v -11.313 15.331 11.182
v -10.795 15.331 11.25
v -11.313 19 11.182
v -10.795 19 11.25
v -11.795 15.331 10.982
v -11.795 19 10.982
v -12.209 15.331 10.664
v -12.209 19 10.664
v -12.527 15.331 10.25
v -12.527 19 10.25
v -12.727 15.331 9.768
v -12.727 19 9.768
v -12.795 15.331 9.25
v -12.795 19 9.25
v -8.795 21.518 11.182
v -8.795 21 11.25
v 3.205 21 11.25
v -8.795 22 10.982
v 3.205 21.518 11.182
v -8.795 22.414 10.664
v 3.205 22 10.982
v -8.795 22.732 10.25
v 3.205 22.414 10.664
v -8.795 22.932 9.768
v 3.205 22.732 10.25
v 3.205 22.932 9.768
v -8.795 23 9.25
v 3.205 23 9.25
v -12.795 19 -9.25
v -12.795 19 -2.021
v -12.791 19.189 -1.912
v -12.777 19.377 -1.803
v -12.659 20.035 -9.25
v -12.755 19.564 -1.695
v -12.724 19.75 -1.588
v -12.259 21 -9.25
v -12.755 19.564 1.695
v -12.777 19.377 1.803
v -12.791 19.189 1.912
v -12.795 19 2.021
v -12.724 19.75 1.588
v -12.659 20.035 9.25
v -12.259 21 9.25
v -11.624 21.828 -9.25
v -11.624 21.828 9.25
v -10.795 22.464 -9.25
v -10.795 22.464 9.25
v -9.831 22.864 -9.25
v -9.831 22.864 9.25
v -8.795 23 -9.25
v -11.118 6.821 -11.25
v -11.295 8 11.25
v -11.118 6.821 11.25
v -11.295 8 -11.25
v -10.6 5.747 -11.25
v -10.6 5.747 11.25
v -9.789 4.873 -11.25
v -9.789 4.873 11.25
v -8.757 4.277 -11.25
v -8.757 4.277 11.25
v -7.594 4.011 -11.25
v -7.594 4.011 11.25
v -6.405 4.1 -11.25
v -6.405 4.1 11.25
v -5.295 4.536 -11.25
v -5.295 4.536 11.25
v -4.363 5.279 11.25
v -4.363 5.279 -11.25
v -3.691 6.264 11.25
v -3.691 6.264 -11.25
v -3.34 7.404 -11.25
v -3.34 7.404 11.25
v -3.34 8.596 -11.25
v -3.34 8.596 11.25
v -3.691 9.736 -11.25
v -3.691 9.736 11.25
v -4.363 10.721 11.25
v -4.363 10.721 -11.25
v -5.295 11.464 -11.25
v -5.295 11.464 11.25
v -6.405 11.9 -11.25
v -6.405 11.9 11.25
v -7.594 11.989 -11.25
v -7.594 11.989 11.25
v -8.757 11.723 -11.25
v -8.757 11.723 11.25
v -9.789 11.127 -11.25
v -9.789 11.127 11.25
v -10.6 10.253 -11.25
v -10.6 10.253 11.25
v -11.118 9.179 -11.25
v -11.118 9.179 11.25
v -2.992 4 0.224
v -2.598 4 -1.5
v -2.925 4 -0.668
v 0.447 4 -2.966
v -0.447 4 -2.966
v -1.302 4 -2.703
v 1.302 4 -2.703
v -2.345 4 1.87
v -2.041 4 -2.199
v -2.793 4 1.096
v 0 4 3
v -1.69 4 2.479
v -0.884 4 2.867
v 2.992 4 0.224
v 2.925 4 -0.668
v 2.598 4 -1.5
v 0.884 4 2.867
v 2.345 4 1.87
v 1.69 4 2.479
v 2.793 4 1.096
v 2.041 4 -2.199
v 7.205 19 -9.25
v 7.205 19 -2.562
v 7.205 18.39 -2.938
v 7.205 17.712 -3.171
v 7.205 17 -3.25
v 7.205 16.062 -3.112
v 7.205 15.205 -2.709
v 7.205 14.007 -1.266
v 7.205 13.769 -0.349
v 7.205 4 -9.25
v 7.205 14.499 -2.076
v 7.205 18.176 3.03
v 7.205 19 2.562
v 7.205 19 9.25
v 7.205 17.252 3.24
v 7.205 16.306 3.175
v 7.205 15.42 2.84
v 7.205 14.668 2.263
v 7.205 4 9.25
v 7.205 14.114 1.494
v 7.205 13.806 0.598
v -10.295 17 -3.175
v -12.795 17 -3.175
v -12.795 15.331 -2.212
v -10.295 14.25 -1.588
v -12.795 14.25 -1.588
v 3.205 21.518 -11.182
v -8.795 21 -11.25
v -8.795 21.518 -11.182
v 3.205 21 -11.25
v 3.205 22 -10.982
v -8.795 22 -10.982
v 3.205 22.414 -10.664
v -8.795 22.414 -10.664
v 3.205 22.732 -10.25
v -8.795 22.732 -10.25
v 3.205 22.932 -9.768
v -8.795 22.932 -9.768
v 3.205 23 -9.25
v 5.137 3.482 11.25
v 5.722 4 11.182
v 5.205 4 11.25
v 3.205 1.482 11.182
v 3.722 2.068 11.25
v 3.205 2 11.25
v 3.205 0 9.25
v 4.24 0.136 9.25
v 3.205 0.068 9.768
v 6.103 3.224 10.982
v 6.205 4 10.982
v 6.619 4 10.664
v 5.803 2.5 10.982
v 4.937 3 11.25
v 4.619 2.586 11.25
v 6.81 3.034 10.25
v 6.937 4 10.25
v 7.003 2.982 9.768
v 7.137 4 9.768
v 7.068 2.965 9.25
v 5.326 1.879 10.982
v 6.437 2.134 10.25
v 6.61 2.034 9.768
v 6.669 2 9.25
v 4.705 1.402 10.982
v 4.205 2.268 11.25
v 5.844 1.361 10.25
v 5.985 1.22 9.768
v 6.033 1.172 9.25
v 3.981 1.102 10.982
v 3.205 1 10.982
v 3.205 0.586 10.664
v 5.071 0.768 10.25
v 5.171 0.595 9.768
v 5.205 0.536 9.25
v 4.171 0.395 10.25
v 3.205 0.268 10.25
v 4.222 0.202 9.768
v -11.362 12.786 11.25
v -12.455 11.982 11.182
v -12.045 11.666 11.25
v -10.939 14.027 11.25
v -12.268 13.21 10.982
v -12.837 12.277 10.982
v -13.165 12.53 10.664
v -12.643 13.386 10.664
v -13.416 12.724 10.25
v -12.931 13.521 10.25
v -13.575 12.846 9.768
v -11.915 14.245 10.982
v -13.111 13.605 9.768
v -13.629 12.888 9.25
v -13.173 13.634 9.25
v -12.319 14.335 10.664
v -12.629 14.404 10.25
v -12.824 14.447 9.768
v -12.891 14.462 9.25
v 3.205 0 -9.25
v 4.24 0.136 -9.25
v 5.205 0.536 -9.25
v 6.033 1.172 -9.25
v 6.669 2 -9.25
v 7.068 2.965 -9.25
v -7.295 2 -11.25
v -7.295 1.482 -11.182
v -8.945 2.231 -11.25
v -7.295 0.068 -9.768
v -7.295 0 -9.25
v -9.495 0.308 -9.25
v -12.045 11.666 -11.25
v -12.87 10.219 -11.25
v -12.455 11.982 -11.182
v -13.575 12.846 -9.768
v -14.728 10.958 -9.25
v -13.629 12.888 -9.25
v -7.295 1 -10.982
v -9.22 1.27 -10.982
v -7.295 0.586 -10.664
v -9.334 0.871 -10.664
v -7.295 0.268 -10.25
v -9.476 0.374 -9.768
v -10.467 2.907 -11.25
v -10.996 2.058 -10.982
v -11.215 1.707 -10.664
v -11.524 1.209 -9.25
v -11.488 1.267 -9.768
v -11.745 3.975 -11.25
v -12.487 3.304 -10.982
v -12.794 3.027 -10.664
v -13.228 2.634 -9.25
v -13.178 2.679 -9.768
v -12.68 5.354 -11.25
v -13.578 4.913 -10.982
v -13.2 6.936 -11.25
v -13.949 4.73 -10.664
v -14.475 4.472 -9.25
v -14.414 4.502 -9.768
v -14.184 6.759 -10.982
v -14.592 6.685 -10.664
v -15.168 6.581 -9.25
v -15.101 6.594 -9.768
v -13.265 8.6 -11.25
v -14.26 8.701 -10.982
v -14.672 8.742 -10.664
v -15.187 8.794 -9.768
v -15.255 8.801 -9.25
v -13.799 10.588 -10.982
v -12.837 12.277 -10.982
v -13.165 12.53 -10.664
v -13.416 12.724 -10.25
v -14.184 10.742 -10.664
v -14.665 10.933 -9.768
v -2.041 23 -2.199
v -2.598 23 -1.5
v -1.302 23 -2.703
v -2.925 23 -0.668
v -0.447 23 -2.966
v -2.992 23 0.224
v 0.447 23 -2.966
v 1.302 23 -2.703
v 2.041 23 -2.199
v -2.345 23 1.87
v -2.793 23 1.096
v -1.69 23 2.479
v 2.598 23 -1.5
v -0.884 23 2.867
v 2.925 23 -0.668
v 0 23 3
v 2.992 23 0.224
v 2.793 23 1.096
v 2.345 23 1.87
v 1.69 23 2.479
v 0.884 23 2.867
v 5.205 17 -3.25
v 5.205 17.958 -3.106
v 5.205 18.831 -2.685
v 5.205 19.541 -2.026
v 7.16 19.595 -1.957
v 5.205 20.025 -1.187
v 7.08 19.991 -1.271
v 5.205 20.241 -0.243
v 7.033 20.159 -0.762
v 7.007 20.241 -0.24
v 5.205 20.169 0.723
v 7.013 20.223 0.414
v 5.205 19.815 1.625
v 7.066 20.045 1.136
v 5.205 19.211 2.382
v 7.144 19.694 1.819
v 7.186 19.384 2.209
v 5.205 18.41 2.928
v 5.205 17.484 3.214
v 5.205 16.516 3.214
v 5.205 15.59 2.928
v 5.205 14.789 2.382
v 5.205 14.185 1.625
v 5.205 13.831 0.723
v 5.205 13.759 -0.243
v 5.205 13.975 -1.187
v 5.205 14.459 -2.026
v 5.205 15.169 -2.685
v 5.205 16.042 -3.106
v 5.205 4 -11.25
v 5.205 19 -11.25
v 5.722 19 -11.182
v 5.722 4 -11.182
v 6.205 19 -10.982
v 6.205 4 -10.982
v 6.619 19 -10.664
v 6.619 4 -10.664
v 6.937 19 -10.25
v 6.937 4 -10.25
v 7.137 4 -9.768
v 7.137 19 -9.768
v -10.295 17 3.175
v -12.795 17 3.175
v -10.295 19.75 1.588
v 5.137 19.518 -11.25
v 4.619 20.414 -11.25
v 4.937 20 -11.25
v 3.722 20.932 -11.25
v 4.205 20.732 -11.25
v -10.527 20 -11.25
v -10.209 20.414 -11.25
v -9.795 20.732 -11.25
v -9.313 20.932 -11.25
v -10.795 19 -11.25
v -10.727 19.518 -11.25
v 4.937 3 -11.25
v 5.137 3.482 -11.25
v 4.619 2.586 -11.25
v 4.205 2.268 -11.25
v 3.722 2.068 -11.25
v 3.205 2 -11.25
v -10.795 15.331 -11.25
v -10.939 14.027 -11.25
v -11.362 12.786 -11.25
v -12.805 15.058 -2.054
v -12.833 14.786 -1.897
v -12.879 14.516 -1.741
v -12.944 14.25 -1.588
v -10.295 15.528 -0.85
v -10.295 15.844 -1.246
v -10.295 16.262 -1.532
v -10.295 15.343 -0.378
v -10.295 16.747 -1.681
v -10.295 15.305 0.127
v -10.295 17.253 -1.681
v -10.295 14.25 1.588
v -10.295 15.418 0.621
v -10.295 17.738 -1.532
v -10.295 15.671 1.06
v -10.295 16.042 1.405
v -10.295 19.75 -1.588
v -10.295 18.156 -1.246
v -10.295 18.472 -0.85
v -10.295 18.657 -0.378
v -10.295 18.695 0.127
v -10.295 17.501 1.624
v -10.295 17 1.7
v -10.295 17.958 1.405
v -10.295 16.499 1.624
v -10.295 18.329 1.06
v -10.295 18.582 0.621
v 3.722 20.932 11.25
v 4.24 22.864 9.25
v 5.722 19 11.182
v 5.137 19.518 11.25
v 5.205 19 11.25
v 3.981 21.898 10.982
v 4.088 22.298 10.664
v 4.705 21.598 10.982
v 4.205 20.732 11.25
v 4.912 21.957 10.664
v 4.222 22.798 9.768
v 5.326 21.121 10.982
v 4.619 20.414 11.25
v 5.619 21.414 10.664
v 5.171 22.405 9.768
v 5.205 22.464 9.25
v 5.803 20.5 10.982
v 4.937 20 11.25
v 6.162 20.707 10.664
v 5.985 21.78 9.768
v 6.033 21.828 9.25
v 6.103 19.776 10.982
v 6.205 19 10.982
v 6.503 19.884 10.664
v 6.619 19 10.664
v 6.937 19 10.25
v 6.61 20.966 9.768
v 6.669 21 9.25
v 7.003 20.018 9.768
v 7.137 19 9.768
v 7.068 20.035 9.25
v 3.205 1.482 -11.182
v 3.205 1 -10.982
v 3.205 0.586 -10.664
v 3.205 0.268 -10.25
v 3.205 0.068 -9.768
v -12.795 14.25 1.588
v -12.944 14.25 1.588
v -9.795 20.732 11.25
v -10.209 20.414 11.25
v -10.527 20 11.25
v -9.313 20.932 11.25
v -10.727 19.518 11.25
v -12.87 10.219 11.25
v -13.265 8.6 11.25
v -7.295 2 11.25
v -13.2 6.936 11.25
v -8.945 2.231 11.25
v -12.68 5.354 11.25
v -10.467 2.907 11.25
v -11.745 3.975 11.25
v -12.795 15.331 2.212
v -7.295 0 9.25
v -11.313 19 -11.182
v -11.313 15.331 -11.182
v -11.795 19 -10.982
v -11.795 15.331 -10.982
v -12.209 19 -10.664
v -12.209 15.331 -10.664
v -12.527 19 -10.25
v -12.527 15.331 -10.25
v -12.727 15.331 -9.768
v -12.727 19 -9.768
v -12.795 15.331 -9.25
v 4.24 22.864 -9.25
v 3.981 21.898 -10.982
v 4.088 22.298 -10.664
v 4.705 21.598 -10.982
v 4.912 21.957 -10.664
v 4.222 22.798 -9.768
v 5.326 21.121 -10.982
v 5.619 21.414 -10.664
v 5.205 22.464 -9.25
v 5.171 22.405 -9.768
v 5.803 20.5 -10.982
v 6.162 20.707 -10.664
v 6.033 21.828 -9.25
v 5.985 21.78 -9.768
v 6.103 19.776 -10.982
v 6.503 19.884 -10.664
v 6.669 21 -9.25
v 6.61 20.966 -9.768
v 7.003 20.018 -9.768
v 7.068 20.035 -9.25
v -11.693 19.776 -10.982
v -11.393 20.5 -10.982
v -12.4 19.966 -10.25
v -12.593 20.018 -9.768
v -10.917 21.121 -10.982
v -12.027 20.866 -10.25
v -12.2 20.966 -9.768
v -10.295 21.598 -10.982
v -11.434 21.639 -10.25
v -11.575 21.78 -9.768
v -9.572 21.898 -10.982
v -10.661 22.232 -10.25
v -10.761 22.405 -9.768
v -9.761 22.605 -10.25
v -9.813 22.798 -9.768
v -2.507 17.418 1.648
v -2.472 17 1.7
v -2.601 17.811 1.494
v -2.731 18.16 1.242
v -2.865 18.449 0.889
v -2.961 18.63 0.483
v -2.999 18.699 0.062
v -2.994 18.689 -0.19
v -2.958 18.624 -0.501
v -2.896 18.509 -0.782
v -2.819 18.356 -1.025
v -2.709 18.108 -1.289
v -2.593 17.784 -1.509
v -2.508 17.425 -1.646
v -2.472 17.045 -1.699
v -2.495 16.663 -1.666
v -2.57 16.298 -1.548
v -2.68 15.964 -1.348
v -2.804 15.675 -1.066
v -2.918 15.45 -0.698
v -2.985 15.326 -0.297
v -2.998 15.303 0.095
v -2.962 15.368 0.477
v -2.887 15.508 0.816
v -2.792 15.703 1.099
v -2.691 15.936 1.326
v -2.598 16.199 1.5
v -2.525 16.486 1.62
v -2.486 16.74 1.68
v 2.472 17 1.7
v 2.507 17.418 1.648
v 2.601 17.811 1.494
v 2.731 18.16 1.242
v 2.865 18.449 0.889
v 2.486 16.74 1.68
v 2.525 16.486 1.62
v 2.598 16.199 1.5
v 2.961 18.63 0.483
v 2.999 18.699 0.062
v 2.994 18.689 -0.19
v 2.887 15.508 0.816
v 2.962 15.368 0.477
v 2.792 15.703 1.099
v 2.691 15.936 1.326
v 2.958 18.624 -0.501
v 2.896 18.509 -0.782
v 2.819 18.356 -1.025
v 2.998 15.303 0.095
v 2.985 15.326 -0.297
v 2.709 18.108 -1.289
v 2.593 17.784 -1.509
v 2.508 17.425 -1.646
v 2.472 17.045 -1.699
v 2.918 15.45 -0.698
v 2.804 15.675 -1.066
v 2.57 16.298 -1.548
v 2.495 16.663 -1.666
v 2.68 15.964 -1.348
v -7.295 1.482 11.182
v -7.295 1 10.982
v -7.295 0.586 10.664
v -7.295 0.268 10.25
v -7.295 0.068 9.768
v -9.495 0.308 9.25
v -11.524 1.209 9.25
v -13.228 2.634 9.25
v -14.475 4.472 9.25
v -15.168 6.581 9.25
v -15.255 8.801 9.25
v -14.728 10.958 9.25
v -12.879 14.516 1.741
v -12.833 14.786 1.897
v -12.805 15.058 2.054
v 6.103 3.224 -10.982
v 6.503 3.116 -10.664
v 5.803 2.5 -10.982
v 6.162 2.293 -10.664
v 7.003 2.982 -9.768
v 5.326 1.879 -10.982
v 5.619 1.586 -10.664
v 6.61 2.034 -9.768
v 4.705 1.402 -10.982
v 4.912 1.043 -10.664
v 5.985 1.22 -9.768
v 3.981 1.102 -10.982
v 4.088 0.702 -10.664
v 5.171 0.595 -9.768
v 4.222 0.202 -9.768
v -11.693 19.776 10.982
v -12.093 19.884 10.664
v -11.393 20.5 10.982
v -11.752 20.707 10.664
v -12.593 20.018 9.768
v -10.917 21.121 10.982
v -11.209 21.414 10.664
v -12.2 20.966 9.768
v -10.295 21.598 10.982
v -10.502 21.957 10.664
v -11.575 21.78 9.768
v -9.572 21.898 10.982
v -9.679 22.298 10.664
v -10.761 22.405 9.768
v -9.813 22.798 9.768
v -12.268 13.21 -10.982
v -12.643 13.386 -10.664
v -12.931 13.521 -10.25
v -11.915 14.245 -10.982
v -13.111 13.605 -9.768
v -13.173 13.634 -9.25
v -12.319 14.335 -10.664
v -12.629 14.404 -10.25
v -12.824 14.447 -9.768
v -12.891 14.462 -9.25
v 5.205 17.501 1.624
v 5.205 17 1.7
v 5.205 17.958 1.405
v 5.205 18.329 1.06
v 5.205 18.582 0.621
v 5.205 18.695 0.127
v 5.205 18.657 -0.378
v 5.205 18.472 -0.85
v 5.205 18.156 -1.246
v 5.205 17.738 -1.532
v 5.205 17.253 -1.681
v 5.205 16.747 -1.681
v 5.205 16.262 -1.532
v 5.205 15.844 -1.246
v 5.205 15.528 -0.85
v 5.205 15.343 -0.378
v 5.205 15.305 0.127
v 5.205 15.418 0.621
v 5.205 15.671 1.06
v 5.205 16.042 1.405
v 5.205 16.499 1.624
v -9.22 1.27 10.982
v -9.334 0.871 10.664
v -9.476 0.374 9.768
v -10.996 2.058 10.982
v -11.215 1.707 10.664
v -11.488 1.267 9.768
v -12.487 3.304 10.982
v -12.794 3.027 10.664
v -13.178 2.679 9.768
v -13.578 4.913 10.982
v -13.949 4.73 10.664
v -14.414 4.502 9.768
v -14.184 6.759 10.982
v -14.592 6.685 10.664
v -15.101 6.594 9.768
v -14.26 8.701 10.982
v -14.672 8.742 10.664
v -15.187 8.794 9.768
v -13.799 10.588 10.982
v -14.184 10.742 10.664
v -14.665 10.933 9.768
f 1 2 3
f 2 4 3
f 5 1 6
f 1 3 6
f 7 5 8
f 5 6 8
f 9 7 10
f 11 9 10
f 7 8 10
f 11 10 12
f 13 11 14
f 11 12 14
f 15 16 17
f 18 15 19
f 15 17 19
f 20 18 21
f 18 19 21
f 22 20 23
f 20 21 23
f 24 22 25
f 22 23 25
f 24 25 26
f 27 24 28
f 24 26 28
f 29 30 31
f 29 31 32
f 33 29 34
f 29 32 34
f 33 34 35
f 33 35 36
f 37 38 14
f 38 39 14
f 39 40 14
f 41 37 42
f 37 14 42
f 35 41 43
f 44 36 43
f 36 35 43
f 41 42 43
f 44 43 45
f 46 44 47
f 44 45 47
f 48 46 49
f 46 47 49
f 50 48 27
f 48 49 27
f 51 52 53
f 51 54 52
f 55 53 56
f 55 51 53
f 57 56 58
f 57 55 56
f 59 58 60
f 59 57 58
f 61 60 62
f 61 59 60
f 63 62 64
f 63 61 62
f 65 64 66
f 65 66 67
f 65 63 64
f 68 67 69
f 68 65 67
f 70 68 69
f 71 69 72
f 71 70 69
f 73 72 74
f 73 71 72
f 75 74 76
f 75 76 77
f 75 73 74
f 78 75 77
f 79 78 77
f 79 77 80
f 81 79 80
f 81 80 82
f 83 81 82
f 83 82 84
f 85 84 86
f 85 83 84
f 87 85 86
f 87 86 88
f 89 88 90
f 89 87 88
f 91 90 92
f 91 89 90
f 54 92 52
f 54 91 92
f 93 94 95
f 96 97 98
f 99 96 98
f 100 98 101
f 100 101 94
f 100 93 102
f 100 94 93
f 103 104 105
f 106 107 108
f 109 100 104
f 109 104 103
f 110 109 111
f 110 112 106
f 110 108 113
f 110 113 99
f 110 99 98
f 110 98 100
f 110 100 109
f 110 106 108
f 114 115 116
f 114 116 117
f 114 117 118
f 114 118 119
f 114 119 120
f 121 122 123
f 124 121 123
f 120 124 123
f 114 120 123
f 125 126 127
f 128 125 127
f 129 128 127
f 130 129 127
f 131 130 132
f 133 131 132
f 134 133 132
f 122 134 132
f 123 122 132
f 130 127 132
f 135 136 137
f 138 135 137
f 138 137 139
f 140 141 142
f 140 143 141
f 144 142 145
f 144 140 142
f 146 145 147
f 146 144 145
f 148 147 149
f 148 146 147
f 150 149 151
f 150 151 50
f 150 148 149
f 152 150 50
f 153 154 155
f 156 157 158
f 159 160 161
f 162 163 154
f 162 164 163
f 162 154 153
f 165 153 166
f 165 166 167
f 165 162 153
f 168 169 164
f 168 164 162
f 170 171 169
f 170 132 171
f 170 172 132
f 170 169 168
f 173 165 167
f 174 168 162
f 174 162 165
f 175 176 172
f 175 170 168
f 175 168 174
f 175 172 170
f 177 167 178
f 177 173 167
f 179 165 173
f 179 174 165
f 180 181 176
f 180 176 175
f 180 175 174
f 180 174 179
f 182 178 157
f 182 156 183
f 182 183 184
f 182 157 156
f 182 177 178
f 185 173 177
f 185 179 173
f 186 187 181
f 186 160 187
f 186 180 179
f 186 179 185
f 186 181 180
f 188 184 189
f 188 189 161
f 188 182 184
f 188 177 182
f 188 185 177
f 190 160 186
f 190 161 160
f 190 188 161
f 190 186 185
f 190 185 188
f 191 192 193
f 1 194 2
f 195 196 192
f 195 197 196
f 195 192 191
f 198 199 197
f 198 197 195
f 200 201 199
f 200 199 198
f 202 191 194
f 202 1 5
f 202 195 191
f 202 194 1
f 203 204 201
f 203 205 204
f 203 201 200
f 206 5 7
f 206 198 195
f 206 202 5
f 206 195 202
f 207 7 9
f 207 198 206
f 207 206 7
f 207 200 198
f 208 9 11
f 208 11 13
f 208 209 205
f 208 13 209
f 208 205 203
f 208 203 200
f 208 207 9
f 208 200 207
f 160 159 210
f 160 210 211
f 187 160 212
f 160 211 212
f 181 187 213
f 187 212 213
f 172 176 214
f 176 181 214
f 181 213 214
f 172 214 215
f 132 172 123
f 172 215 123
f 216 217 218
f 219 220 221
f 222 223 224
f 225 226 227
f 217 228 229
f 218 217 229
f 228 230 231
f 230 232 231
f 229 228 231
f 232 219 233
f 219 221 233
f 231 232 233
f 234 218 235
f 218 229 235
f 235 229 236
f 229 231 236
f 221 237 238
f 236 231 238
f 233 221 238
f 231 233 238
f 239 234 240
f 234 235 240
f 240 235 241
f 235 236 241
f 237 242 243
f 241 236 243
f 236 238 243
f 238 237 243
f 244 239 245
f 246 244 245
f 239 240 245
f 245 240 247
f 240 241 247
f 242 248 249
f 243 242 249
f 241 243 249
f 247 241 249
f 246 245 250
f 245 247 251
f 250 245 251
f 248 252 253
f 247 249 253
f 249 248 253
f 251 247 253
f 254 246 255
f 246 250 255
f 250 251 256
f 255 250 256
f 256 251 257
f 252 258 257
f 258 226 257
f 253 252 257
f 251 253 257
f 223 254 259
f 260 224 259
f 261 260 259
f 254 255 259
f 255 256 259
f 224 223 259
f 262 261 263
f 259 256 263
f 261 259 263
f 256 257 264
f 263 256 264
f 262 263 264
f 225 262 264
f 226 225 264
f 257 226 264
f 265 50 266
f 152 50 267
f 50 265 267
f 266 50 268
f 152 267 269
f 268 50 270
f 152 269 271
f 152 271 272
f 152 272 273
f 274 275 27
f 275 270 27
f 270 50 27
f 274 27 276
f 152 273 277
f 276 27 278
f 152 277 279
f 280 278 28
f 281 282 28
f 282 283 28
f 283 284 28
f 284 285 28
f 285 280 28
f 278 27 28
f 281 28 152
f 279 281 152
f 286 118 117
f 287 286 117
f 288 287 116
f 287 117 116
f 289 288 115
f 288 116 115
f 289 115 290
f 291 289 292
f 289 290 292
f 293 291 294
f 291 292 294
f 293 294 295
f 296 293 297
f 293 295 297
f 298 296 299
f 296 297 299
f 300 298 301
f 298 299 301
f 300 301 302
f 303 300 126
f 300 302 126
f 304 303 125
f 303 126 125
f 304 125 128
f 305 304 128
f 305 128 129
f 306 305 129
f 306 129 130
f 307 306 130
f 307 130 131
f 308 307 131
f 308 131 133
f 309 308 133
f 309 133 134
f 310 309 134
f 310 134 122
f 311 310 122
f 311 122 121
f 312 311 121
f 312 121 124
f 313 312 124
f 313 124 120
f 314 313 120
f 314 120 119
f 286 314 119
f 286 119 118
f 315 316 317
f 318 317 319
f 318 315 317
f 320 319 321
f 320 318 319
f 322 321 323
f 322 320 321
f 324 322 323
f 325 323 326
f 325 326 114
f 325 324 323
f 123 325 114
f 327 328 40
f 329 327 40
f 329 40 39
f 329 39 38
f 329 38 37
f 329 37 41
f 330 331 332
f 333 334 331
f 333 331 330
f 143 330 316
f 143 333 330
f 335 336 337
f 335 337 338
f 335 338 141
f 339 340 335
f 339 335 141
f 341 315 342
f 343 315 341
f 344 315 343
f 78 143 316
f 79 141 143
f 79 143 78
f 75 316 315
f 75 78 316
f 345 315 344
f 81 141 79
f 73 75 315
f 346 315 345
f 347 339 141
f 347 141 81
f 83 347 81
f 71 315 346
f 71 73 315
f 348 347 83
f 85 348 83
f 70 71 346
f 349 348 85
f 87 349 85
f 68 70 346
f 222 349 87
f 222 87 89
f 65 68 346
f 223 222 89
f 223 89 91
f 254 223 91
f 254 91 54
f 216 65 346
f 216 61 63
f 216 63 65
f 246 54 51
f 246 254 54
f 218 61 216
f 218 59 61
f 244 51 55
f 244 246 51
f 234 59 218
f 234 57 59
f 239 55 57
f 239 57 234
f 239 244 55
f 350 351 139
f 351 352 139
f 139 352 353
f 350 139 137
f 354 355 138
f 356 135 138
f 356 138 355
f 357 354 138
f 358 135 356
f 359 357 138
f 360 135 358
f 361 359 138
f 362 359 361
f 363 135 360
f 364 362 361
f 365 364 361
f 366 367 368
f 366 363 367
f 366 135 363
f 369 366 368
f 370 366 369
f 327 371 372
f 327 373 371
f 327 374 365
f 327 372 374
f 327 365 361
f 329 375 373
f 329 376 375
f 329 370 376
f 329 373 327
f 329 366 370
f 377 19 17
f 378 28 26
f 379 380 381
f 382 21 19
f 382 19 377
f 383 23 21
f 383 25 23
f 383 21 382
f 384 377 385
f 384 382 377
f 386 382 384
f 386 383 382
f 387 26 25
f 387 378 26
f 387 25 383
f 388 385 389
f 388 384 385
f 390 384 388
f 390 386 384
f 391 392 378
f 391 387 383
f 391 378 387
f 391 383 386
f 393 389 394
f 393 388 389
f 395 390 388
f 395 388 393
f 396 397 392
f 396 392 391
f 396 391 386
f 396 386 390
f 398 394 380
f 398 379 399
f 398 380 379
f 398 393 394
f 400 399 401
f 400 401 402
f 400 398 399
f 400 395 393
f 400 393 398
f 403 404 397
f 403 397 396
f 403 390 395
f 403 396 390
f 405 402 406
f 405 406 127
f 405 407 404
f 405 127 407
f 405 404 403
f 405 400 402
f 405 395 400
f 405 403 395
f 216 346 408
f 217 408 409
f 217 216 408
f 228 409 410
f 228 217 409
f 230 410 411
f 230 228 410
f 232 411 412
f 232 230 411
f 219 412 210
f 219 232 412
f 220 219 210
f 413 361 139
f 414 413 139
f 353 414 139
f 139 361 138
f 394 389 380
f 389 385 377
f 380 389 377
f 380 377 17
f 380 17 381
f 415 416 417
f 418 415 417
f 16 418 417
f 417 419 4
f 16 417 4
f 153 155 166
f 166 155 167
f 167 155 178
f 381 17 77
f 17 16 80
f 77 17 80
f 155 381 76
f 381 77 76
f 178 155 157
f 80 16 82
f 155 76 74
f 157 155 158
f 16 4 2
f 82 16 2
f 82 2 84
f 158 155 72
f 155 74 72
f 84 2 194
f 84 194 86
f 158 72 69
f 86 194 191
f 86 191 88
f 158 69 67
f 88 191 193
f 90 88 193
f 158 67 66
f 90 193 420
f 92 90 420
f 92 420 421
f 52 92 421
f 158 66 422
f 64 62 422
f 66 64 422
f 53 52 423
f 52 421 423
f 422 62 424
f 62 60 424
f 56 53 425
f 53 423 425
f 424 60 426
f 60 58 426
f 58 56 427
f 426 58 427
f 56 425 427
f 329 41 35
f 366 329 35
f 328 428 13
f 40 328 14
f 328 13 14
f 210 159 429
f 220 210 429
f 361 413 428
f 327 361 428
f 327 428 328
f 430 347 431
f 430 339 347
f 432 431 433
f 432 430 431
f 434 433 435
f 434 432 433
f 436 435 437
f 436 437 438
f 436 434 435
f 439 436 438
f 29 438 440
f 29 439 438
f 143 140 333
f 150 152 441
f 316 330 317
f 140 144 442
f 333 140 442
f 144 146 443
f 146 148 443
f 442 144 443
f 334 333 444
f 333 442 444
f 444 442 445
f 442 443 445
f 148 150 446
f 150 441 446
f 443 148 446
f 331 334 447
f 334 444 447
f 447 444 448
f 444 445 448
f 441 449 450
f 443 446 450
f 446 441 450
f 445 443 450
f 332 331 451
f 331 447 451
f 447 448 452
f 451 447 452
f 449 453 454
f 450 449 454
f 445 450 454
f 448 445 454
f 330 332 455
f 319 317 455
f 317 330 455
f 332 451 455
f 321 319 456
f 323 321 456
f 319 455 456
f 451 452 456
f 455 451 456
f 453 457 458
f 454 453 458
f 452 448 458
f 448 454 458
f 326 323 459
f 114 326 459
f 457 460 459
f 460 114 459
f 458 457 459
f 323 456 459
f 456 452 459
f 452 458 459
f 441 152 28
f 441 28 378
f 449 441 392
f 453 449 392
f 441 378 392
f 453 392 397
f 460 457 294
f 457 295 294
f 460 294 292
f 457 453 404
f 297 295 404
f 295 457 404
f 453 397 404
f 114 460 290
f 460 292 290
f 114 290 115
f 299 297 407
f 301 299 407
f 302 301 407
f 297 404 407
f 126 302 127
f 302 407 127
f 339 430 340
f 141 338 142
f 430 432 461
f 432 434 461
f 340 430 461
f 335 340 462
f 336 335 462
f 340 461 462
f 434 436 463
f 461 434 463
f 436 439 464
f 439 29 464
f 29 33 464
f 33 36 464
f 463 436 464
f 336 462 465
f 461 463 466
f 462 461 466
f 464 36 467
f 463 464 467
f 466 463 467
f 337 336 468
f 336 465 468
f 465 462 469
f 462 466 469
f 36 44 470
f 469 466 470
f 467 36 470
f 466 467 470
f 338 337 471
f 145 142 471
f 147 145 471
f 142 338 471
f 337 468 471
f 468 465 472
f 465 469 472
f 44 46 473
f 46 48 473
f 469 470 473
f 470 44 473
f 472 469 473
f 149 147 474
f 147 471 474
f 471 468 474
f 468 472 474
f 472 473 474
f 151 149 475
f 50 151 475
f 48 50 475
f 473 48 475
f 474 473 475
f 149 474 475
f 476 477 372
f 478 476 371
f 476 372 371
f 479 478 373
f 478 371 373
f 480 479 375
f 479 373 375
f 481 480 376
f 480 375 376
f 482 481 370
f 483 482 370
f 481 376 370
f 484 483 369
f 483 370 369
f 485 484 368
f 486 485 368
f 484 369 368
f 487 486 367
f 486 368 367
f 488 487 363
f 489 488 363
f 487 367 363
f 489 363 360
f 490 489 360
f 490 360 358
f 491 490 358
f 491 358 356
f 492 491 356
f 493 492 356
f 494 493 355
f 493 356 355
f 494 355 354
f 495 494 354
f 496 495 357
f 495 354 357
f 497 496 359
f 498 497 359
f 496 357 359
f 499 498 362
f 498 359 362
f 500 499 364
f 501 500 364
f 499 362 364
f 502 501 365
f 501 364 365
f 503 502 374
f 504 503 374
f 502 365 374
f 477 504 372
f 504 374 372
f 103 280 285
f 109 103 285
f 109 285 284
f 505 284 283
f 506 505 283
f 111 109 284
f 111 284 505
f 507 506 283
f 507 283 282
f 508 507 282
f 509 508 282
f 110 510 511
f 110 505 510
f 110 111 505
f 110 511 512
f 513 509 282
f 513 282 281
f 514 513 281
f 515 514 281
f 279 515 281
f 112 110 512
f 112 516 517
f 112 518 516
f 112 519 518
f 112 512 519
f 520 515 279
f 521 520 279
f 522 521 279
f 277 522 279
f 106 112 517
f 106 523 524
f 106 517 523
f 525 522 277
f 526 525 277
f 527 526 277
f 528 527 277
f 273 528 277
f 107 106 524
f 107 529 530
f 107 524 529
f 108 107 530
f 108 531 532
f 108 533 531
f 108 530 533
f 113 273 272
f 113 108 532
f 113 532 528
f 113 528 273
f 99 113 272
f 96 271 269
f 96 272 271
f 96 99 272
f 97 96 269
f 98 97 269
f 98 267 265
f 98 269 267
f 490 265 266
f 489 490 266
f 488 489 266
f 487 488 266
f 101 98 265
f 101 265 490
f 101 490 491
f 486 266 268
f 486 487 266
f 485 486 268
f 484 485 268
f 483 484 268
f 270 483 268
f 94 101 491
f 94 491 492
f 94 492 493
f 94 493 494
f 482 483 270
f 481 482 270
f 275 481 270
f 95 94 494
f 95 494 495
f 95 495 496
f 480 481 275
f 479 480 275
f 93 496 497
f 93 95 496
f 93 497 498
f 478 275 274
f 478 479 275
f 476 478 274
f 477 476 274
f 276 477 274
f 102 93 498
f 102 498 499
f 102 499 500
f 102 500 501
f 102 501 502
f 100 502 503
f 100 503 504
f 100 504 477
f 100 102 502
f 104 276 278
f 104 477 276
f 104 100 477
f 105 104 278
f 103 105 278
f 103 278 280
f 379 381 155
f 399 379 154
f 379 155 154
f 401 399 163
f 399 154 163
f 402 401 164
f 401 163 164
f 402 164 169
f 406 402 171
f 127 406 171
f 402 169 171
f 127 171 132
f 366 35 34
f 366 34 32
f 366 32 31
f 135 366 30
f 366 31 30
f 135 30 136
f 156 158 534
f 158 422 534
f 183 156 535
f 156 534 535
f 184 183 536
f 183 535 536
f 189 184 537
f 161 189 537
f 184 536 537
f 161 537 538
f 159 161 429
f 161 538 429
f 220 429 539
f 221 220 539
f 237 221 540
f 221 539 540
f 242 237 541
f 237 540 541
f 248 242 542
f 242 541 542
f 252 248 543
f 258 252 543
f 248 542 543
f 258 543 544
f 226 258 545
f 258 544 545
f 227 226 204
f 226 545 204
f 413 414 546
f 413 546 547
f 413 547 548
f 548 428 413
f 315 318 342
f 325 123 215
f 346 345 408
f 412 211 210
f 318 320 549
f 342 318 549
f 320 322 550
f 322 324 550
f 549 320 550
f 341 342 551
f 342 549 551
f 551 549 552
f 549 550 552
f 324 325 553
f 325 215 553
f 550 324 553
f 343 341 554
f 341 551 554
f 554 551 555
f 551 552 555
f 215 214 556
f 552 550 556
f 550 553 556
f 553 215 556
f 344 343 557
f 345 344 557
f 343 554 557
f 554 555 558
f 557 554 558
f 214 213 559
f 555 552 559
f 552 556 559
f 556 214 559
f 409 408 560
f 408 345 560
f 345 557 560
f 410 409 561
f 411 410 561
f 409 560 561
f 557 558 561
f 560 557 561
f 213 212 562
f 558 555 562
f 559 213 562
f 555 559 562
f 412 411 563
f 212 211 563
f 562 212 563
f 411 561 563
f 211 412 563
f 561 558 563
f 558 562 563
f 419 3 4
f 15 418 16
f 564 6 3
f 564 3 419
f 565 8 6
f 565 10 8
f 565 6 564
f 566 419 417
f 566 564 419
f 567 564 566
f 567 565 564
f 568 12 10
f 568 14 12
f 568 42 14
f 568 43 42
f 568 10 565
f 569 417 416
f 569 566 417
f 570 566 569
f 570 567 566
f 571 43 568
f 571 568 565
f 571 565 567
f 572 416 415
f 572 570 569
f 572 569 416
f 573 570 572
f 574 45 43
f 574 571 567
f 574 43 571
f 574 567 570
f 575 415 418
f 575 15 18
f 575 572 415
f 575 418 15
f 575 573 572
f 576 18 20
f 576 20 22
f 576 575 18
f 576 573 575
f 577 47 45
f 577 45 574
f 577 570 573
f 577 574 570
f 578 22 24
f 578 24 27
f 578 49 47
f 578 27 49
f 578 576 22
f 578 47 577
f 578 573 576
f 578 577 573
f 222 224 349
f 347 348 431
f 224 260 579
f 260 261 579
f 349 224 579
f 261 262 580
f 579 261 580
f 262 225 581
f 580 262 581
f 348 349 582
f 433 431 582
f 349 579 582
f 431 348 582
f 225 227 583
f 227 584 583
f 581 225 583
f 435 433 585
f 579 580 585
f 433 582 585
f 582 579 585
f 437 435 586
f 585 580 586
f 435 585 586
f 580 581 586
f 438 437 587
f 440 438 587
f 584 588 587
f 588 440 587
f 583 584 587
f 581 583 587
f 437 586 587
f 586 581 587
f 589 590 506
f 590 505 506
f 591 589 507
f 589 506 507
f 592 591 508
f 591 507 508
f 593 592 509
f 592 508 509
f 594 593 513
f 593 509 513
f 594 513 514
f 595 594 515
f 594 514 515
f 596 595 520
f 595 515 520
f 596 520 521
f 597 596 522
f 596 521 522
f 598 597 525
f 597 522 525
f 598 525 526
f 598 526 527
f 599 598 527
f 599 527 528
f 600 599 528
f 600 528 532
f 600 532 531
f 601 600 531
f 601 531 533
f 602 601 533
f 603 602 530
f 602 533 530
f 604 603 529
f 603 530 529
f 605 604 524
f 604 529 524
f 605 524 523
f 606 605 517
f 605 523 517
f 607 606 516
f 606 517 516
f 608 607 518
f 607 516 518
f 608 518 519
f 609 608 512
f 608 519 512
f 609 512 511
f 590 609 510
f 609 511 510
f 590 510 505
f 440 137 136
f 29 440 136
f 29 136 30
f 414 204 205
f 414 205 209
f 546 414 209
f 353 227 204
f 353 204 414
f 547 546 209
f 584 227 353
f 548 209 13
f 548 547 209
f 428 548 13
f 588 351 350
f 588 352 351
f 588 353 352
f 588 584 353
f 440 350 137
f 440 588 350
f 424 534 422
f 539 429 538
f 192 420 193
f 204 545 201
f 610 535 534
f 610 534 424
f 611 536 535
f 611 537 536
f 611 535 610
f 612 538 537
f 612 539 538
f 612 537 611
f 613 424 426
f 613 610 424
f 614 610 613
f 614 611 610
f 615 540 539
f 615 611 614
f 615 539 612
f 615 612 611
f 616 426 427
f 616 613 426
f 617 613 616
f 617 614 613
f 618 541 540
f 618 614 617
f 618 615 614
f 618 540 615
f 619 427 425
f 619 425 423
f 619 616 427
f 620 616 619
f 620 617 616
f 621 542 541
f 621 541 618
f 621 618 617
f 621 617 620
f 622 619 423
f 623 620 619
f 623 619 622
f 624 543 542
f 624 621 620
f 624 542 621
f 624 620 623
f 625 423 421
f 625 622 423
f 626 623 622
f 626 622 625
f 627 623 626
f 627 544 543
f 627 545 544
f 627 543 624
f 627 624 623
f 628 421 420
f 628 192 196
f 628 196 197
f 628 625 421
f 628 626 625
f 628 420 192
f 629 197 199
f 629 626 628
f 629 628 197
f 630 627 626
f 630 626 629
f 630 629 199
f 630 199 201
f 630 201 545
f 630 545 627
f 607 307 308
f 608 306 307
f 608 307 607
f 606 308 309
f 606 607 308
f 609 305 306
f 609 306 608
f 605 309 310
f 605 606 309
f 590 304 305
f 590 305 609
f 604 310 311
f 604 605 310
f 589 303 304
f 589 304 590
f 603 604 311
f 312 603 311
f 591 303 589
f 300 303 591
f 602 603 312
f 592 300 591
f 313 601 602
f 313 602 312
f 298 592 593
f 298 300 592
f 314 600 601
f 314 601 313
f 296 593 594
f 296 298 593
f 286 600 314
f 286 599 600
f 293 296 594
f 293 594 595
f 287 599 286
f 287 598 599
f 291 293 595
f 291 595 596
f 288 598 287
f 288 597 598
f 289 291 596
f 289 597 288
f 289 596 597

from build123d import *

# Parameters (mm, degrees)
ESQUISSE1_R                                     = 4
BOSS_EXTRU_1_DEPTH                              = 11.25
ENL_V_START                                     = 4
ESQUISSE2_R                                     = 3
ENL_V_MAT_EXTRU_1_DEPTH                         = 26.824610856
CHAMBRAGE_POUR_VIS_T_TE_CYLINDRIQUE_D           = 3.4
CHAMBRAGE_POUR_VIS_T_TE_CYLINDRIQUE_CBORE_D     = 6.5
CHAMBRAGE_POUR_VIS_T_TE_CYLINDRIQUE_CBORE_DEPTH = 2
ENL_V_MAT_EXTRU_6_DEPTH                         = 2.5
CONG_3_R                                        = 4
CONG_4_R                                        = 2


with BuildPart() as part:
    # Esquisse1 → Boss.-Extru.1 (new, symmetric)
    with BuildSketch(Plane.XY):
        with BuildLine():
            Line((-12.79525785, 23), (7.20474215, 23))
            Line((7.20474215, 23), (7.20474215, 0))
            Line((7.20474215, 0), (-7.29525785, 0))
            ThreePointArc((-7.29525785, 0), (-14.72747825, 5.039915555), (-12.79525785, 13.809475019))
            Line((-12.79525785, 13.809475019), (-12.79525785, 23))
        make_face()
        with Locations(Location((-7.29525785, 8, 0), (0, 0, 180))):
            Circle(ESQUISSE1_R, mode=Mode.SUBTRACT)
    extrude(amount=BOSS_EXTRU_1_DEPTH, both=True)

    # Esquisse2 → Enlèv. mat.-Extru.1 (cut, through all)
    with BuildSketch(Plane(origin=(0, 0, 0), x_dir=(1, 0, 0), z_dir=(0, 1, 0)).offset(ENL_V_START)):
        with Locations(Location((0, 0, 0), (0, 0, 270))):
            Circle(ESQUISSE2_R)
    extrude(amount=ENL_V_MAT_EXTRU_1_DEPTH, mode=Mode.SUBTRACT)

    # Chambrage pour vis à tête cylindrique à 6 pans creux (ou vis CHC) M31 (through all)
    with Locations(Plane(origin=(7.20474215, 0, 0), x_dir=(0, 0, -1), z_dir=(1, 0, 0))):
        with Locations((0, 17)):
            CounterBoreHole(CHAMBRAGE_POUR_VIS_T_TE_CYLINDRIQUE_D / 2, CHAMBRAGE_POUR_VIS_T_TE_CYLINDRIQUE_CBORE_D / 2, CHAMBRAGE_POUR_VIS_T_TE_CYLINDRIQUE_CBORE_DEPTH)

    # Esquisse10 → Enlèv. mat.-Extru.6 (cut)
    with BuildSketch(Plane.ZY.offset(12.79525785)):
        Polygon((1.58771324, 14.25), (3.175426481, 17), (1.58771324, 19.75), (-1.58771324, 19.75), (-3.175426481, 17), (-1.58771324, 14.25), align=None)
    extrude(amount=-ENL_V_MAT_EXTRU_6_DEPTH, mode=Mode.SUBTRACT)

    # Congé3
    # the kernel refuses this fillet: 4 mm, written as the material it adds along each edge
    with BuildSketch(Plane(origin=(-12.79525785, 13.809475019, -11.25), x_dir=(0, 1, 0), z_dir=(0, 0, 1))) as cong_3_piece_1_section:
        with BuildLine():
            CenterArc((1.52196413, 4), CONG_3_R, 232.341537994, 37.658462006)
            ThreePointArc((-0.92184892, 0.833333333), (-0.444719275, 0.434593145), (0, 0))
            Line((0, 0), (1.52196413, 0))
        make_face()
    cong_3_piece_1 = extrude(amount=22.5, mode=Mode.PRIVATE)
    cong_3_piece_1 = split(cong_3_piece_1, bisect_by=Plane(origin=(-12.787909879, 14.25, -6.543416313), z_dir=(0, 1, 0)), keep=Keep.TOP, mode=Mode.PRIVATE)
    cong_3_piece_1 = split(cong_3_piece_1, bisect_by=Plane(origin=(-12.787909879, 16.719497951, -3.013478547), z_dir=(0, -0.5000000000000004, -0.8660254037844384)), keep=Keep.TOP, mode=Mode.PRIVATE)
    add(cong_3_piece_1)
    with BuildSketch(Plane(origin=(-12.79525785, 13.809475019, -11.25), x_dir=(0, 1, 0), z_dir=(0, 0, 1))) as cong_3_piece_2_section:
        with BuildLine():
            CenterArc((1.52196413, 4), CONG_3_R, 232.341537994, 37.658462006)
            ThreePointArc((-0.92184892, 0.833333333), (-0.444719275, 0.434593145), (0, 0))
            Line((0, 0), (1.52196413, 0))
        make_face()
    cong_3_piece_2 = extrude(amount=22.5, mode=Mode.PRIVATE)
    cong_3_piece_2 = split(cong_3_piece_2, bisect_by=Plane(origin=(-13.040905226, 14.25, -6.25233642), z_dir=(0, -1, 0)), keep=Keep.TOP, mode=Mode.PRIVATE)
    cong_3_piece_2 = split(cong_3_piece_2, bisect_by=Plane(origin=(-13.040905226, 15.837208914, -2.504088734), z_dir=(0, -0.5000000000000004, -0.8660254037844384)), keep=Keep.TOP, mode=Mode.PRIVATE)
    add(cong_3_piece_2)
    with BuildSketch(Plane(origin=(-12.79525785, 13.809475019, -11.25), x_dir=(0, 1, 0), z_dir=(0, 0, 1))) as cong_3_piece_3_section:
        with BuildLine():
            CenterArc((1.52196413, 4), CONG_3_R, 232.341537994, 37.658462006)
            ThreePointArc((-0.92184892, 0.833333333), (-0.444719275, 0.434593145), (0, 0))
            Line((0, 0), (1.52196413, 0))
        make_face()
    cong_3_piece_3 = extrude(amount=22.5, mode=Mode.PRIVATE)
    cong_3_piece_3 = split(cong_3_piece_3, bisect_by=Plane(origin=(-13.005461126, 14.25, 0), z_dir=(0, -1, 0)), keep=Keep.TOP, mode=Mode.PRIVATE)
    cong_3_piece_3 = split(cong_3_piece_3, bisect_by=Plane(origin=(-13.005461126, 13.176729328, -0.968060129), z_dir=(0, 0.5000000000000004, 0.8660254037844384)), keep=Keep.TOP, mode=Mode.PRIVATE)
    cong_3_piece_3 = split(cong_3_piece_3, bisect_by=Plane(origin=(-13.005461126, 13.176729328, 0.968060129), z_dir=(0, 0.49999999999999994, -0.8660254037844387)), keep=Keep.TOP, mode=Mode.PRIVATE)
    add(cong_3_piece_3)
    with BuildSketch(Plane(origin=(-12.79525785, 13.809475019, -11.25), x_dir=(0, 1, 0), z_dir=(0, 0, 1))) as cong_3_piece_4_section:
        with BuildLine():
            CenterArc((1.52196413, 4), CONG_3_R, 232.341537994, 37.658462006)
            ThreePointArc((-0.92184892, 0.833333333), (-0.444719275, 0.434593145), (0, 0))
            Line((0, 0), (1.52196413, 0))
        make_face()
    cong_3_piece_4 = extrude(amount=22.5, mode=Mode.PRIVATE)
    cong_3_piece_4 = split(cong_3_piece_4, bisect_by=Plane(origin=(-12.787909879, 14.25, 6.543416313), z_dir=(0, 1, 0)), keep=Keep.TOP, mode=Mode.PRIVATE)
    cong_3_piece_4 = split(cong_3_piece_4, bisect_by=Plane(origin=(-12.787909879, 16.719497951, 3.013478547), z_dir=(0, -0.49999999999999994, 0.8660254037844387)), keep=Keep.TOP, mode=Mode.PRIVATE)
    add(cong_3_piece_4)
    with BuildSketch(Plane(origin=(-12.79525785, 13.809475019, -11.25), x_dir=(0, 1, 0), z_dir=(0, 0, 1))) as cong_3_piece_5_section:
        with BuildLine():
            CenterArc((1.52196413, 4), CONG_3_R, 232.341537994, 37.658462006)
            ThreePointArc((-0.92184892, 0.833333333), (-0.444719275, 0.434593145), (0, 0))
            Line((0, 0), (1.52196413, 0))
        make_face()
    cong_3_piece_5 = extrude(amount=22.5, mode=Mode.PRIVATE)
    cong_3_piece_5 = split(cong_3_piece_5, bisect_by=Plane(origin=(-13.040905226, 14.25, 6.25233642), z_dir=(0, -1, 0)), keep=Keep.TOP, mode=Mode.PRIVATE)
    cong_3_piece_5 = split(cong_3_piece_5, bisect_by=Plane(origin=(-13.040905226, 15.837208914, 2.504088734), z_dir=(0, -0.49999999999999994, 0.8660254037844387)), keep=Keep.TOP, mode=Mode.PRIVATE)
    add(cong_3_piece_5)
    # the kernel refuses this fillet: 4 mm, written as the material it takes off along each edge
    with BuildSketch(Plane(origin=(7.20474215, 0, -21.25), x_dir=(-1, 0, 0), z_dir=(0, 0, 1)), Plane(origin=(-12.79525785, 23, 21.25), x_dir=(0, -1, 0), z_dir=(0, 0, -1))) as cong_3_2_piece_1:
        with BuildLine():
            CenterArc((CONG_3_R, -CONG_3_R), CONG_3_R, 90, 90)
            Line((0, -CONG_3_R), (0, 0))
            Line((0, 0), (CONG_3_R, 0))
        make_face()
    extrude(amount=42.5, mode=Mode.SUBTRACT)
    with BuildSketch(Plane(origin=(7.20474215, 23, 21.25), x_dir=(0, -1, 0), z_dir=(0, 0, -1))) as cong_3_2_piece_2:
        with BuildLine():
            CenterArc((CONG_3_R, CONG_3_R), CONG_3_R, 180, 90)
            Line((0, CONG_3_R), (0, 0))
            Line((0, 0), (CONG_3_R, 0))
        make_face()
    extrude(amount=42.5, mode=Mode.SUBTRACT)

    # Congé4
    cong_4_edges = [part.edges().sort_by_distance(p)[0] for p in [
        (-2.04525785, 0, 11.25),
        (-2.79525785, 23, -11.25),
        (-2.79525785, 23, 11.25),
        (-2.04525785, 0, -11.25),
        (-12.79525785, 17.165719575, -11.25),
        (7.20474215, 11.5, -11.25),
        (-14.475125843, 4.471615724, -11.25),
        (-11.623684975, 21.828427125, -11.25),
        (6.033169275, 1.171572875, -11.25),
        (6.033169275, 21.828427125, -11.25),
        (7.20474215, 11.5, 11.25),
        (-12.79525785, 17.165719575, 11.25),
        (-14.475125843, 4.471615724, 11.25),
        (-11.623684975, 21.828427125, 11.25),
        (6.033169275, 1.171572875, 11.25),
        (6.033169275, 21.828427125, 11.25),
        (-13.009318953, 14.040444701, -11.25),
        (-13.009318953, 14.040444701, 11.25),
    ]]
    fillet(cong_4_edges, radius=CONG_4_R)


solid = part.part
